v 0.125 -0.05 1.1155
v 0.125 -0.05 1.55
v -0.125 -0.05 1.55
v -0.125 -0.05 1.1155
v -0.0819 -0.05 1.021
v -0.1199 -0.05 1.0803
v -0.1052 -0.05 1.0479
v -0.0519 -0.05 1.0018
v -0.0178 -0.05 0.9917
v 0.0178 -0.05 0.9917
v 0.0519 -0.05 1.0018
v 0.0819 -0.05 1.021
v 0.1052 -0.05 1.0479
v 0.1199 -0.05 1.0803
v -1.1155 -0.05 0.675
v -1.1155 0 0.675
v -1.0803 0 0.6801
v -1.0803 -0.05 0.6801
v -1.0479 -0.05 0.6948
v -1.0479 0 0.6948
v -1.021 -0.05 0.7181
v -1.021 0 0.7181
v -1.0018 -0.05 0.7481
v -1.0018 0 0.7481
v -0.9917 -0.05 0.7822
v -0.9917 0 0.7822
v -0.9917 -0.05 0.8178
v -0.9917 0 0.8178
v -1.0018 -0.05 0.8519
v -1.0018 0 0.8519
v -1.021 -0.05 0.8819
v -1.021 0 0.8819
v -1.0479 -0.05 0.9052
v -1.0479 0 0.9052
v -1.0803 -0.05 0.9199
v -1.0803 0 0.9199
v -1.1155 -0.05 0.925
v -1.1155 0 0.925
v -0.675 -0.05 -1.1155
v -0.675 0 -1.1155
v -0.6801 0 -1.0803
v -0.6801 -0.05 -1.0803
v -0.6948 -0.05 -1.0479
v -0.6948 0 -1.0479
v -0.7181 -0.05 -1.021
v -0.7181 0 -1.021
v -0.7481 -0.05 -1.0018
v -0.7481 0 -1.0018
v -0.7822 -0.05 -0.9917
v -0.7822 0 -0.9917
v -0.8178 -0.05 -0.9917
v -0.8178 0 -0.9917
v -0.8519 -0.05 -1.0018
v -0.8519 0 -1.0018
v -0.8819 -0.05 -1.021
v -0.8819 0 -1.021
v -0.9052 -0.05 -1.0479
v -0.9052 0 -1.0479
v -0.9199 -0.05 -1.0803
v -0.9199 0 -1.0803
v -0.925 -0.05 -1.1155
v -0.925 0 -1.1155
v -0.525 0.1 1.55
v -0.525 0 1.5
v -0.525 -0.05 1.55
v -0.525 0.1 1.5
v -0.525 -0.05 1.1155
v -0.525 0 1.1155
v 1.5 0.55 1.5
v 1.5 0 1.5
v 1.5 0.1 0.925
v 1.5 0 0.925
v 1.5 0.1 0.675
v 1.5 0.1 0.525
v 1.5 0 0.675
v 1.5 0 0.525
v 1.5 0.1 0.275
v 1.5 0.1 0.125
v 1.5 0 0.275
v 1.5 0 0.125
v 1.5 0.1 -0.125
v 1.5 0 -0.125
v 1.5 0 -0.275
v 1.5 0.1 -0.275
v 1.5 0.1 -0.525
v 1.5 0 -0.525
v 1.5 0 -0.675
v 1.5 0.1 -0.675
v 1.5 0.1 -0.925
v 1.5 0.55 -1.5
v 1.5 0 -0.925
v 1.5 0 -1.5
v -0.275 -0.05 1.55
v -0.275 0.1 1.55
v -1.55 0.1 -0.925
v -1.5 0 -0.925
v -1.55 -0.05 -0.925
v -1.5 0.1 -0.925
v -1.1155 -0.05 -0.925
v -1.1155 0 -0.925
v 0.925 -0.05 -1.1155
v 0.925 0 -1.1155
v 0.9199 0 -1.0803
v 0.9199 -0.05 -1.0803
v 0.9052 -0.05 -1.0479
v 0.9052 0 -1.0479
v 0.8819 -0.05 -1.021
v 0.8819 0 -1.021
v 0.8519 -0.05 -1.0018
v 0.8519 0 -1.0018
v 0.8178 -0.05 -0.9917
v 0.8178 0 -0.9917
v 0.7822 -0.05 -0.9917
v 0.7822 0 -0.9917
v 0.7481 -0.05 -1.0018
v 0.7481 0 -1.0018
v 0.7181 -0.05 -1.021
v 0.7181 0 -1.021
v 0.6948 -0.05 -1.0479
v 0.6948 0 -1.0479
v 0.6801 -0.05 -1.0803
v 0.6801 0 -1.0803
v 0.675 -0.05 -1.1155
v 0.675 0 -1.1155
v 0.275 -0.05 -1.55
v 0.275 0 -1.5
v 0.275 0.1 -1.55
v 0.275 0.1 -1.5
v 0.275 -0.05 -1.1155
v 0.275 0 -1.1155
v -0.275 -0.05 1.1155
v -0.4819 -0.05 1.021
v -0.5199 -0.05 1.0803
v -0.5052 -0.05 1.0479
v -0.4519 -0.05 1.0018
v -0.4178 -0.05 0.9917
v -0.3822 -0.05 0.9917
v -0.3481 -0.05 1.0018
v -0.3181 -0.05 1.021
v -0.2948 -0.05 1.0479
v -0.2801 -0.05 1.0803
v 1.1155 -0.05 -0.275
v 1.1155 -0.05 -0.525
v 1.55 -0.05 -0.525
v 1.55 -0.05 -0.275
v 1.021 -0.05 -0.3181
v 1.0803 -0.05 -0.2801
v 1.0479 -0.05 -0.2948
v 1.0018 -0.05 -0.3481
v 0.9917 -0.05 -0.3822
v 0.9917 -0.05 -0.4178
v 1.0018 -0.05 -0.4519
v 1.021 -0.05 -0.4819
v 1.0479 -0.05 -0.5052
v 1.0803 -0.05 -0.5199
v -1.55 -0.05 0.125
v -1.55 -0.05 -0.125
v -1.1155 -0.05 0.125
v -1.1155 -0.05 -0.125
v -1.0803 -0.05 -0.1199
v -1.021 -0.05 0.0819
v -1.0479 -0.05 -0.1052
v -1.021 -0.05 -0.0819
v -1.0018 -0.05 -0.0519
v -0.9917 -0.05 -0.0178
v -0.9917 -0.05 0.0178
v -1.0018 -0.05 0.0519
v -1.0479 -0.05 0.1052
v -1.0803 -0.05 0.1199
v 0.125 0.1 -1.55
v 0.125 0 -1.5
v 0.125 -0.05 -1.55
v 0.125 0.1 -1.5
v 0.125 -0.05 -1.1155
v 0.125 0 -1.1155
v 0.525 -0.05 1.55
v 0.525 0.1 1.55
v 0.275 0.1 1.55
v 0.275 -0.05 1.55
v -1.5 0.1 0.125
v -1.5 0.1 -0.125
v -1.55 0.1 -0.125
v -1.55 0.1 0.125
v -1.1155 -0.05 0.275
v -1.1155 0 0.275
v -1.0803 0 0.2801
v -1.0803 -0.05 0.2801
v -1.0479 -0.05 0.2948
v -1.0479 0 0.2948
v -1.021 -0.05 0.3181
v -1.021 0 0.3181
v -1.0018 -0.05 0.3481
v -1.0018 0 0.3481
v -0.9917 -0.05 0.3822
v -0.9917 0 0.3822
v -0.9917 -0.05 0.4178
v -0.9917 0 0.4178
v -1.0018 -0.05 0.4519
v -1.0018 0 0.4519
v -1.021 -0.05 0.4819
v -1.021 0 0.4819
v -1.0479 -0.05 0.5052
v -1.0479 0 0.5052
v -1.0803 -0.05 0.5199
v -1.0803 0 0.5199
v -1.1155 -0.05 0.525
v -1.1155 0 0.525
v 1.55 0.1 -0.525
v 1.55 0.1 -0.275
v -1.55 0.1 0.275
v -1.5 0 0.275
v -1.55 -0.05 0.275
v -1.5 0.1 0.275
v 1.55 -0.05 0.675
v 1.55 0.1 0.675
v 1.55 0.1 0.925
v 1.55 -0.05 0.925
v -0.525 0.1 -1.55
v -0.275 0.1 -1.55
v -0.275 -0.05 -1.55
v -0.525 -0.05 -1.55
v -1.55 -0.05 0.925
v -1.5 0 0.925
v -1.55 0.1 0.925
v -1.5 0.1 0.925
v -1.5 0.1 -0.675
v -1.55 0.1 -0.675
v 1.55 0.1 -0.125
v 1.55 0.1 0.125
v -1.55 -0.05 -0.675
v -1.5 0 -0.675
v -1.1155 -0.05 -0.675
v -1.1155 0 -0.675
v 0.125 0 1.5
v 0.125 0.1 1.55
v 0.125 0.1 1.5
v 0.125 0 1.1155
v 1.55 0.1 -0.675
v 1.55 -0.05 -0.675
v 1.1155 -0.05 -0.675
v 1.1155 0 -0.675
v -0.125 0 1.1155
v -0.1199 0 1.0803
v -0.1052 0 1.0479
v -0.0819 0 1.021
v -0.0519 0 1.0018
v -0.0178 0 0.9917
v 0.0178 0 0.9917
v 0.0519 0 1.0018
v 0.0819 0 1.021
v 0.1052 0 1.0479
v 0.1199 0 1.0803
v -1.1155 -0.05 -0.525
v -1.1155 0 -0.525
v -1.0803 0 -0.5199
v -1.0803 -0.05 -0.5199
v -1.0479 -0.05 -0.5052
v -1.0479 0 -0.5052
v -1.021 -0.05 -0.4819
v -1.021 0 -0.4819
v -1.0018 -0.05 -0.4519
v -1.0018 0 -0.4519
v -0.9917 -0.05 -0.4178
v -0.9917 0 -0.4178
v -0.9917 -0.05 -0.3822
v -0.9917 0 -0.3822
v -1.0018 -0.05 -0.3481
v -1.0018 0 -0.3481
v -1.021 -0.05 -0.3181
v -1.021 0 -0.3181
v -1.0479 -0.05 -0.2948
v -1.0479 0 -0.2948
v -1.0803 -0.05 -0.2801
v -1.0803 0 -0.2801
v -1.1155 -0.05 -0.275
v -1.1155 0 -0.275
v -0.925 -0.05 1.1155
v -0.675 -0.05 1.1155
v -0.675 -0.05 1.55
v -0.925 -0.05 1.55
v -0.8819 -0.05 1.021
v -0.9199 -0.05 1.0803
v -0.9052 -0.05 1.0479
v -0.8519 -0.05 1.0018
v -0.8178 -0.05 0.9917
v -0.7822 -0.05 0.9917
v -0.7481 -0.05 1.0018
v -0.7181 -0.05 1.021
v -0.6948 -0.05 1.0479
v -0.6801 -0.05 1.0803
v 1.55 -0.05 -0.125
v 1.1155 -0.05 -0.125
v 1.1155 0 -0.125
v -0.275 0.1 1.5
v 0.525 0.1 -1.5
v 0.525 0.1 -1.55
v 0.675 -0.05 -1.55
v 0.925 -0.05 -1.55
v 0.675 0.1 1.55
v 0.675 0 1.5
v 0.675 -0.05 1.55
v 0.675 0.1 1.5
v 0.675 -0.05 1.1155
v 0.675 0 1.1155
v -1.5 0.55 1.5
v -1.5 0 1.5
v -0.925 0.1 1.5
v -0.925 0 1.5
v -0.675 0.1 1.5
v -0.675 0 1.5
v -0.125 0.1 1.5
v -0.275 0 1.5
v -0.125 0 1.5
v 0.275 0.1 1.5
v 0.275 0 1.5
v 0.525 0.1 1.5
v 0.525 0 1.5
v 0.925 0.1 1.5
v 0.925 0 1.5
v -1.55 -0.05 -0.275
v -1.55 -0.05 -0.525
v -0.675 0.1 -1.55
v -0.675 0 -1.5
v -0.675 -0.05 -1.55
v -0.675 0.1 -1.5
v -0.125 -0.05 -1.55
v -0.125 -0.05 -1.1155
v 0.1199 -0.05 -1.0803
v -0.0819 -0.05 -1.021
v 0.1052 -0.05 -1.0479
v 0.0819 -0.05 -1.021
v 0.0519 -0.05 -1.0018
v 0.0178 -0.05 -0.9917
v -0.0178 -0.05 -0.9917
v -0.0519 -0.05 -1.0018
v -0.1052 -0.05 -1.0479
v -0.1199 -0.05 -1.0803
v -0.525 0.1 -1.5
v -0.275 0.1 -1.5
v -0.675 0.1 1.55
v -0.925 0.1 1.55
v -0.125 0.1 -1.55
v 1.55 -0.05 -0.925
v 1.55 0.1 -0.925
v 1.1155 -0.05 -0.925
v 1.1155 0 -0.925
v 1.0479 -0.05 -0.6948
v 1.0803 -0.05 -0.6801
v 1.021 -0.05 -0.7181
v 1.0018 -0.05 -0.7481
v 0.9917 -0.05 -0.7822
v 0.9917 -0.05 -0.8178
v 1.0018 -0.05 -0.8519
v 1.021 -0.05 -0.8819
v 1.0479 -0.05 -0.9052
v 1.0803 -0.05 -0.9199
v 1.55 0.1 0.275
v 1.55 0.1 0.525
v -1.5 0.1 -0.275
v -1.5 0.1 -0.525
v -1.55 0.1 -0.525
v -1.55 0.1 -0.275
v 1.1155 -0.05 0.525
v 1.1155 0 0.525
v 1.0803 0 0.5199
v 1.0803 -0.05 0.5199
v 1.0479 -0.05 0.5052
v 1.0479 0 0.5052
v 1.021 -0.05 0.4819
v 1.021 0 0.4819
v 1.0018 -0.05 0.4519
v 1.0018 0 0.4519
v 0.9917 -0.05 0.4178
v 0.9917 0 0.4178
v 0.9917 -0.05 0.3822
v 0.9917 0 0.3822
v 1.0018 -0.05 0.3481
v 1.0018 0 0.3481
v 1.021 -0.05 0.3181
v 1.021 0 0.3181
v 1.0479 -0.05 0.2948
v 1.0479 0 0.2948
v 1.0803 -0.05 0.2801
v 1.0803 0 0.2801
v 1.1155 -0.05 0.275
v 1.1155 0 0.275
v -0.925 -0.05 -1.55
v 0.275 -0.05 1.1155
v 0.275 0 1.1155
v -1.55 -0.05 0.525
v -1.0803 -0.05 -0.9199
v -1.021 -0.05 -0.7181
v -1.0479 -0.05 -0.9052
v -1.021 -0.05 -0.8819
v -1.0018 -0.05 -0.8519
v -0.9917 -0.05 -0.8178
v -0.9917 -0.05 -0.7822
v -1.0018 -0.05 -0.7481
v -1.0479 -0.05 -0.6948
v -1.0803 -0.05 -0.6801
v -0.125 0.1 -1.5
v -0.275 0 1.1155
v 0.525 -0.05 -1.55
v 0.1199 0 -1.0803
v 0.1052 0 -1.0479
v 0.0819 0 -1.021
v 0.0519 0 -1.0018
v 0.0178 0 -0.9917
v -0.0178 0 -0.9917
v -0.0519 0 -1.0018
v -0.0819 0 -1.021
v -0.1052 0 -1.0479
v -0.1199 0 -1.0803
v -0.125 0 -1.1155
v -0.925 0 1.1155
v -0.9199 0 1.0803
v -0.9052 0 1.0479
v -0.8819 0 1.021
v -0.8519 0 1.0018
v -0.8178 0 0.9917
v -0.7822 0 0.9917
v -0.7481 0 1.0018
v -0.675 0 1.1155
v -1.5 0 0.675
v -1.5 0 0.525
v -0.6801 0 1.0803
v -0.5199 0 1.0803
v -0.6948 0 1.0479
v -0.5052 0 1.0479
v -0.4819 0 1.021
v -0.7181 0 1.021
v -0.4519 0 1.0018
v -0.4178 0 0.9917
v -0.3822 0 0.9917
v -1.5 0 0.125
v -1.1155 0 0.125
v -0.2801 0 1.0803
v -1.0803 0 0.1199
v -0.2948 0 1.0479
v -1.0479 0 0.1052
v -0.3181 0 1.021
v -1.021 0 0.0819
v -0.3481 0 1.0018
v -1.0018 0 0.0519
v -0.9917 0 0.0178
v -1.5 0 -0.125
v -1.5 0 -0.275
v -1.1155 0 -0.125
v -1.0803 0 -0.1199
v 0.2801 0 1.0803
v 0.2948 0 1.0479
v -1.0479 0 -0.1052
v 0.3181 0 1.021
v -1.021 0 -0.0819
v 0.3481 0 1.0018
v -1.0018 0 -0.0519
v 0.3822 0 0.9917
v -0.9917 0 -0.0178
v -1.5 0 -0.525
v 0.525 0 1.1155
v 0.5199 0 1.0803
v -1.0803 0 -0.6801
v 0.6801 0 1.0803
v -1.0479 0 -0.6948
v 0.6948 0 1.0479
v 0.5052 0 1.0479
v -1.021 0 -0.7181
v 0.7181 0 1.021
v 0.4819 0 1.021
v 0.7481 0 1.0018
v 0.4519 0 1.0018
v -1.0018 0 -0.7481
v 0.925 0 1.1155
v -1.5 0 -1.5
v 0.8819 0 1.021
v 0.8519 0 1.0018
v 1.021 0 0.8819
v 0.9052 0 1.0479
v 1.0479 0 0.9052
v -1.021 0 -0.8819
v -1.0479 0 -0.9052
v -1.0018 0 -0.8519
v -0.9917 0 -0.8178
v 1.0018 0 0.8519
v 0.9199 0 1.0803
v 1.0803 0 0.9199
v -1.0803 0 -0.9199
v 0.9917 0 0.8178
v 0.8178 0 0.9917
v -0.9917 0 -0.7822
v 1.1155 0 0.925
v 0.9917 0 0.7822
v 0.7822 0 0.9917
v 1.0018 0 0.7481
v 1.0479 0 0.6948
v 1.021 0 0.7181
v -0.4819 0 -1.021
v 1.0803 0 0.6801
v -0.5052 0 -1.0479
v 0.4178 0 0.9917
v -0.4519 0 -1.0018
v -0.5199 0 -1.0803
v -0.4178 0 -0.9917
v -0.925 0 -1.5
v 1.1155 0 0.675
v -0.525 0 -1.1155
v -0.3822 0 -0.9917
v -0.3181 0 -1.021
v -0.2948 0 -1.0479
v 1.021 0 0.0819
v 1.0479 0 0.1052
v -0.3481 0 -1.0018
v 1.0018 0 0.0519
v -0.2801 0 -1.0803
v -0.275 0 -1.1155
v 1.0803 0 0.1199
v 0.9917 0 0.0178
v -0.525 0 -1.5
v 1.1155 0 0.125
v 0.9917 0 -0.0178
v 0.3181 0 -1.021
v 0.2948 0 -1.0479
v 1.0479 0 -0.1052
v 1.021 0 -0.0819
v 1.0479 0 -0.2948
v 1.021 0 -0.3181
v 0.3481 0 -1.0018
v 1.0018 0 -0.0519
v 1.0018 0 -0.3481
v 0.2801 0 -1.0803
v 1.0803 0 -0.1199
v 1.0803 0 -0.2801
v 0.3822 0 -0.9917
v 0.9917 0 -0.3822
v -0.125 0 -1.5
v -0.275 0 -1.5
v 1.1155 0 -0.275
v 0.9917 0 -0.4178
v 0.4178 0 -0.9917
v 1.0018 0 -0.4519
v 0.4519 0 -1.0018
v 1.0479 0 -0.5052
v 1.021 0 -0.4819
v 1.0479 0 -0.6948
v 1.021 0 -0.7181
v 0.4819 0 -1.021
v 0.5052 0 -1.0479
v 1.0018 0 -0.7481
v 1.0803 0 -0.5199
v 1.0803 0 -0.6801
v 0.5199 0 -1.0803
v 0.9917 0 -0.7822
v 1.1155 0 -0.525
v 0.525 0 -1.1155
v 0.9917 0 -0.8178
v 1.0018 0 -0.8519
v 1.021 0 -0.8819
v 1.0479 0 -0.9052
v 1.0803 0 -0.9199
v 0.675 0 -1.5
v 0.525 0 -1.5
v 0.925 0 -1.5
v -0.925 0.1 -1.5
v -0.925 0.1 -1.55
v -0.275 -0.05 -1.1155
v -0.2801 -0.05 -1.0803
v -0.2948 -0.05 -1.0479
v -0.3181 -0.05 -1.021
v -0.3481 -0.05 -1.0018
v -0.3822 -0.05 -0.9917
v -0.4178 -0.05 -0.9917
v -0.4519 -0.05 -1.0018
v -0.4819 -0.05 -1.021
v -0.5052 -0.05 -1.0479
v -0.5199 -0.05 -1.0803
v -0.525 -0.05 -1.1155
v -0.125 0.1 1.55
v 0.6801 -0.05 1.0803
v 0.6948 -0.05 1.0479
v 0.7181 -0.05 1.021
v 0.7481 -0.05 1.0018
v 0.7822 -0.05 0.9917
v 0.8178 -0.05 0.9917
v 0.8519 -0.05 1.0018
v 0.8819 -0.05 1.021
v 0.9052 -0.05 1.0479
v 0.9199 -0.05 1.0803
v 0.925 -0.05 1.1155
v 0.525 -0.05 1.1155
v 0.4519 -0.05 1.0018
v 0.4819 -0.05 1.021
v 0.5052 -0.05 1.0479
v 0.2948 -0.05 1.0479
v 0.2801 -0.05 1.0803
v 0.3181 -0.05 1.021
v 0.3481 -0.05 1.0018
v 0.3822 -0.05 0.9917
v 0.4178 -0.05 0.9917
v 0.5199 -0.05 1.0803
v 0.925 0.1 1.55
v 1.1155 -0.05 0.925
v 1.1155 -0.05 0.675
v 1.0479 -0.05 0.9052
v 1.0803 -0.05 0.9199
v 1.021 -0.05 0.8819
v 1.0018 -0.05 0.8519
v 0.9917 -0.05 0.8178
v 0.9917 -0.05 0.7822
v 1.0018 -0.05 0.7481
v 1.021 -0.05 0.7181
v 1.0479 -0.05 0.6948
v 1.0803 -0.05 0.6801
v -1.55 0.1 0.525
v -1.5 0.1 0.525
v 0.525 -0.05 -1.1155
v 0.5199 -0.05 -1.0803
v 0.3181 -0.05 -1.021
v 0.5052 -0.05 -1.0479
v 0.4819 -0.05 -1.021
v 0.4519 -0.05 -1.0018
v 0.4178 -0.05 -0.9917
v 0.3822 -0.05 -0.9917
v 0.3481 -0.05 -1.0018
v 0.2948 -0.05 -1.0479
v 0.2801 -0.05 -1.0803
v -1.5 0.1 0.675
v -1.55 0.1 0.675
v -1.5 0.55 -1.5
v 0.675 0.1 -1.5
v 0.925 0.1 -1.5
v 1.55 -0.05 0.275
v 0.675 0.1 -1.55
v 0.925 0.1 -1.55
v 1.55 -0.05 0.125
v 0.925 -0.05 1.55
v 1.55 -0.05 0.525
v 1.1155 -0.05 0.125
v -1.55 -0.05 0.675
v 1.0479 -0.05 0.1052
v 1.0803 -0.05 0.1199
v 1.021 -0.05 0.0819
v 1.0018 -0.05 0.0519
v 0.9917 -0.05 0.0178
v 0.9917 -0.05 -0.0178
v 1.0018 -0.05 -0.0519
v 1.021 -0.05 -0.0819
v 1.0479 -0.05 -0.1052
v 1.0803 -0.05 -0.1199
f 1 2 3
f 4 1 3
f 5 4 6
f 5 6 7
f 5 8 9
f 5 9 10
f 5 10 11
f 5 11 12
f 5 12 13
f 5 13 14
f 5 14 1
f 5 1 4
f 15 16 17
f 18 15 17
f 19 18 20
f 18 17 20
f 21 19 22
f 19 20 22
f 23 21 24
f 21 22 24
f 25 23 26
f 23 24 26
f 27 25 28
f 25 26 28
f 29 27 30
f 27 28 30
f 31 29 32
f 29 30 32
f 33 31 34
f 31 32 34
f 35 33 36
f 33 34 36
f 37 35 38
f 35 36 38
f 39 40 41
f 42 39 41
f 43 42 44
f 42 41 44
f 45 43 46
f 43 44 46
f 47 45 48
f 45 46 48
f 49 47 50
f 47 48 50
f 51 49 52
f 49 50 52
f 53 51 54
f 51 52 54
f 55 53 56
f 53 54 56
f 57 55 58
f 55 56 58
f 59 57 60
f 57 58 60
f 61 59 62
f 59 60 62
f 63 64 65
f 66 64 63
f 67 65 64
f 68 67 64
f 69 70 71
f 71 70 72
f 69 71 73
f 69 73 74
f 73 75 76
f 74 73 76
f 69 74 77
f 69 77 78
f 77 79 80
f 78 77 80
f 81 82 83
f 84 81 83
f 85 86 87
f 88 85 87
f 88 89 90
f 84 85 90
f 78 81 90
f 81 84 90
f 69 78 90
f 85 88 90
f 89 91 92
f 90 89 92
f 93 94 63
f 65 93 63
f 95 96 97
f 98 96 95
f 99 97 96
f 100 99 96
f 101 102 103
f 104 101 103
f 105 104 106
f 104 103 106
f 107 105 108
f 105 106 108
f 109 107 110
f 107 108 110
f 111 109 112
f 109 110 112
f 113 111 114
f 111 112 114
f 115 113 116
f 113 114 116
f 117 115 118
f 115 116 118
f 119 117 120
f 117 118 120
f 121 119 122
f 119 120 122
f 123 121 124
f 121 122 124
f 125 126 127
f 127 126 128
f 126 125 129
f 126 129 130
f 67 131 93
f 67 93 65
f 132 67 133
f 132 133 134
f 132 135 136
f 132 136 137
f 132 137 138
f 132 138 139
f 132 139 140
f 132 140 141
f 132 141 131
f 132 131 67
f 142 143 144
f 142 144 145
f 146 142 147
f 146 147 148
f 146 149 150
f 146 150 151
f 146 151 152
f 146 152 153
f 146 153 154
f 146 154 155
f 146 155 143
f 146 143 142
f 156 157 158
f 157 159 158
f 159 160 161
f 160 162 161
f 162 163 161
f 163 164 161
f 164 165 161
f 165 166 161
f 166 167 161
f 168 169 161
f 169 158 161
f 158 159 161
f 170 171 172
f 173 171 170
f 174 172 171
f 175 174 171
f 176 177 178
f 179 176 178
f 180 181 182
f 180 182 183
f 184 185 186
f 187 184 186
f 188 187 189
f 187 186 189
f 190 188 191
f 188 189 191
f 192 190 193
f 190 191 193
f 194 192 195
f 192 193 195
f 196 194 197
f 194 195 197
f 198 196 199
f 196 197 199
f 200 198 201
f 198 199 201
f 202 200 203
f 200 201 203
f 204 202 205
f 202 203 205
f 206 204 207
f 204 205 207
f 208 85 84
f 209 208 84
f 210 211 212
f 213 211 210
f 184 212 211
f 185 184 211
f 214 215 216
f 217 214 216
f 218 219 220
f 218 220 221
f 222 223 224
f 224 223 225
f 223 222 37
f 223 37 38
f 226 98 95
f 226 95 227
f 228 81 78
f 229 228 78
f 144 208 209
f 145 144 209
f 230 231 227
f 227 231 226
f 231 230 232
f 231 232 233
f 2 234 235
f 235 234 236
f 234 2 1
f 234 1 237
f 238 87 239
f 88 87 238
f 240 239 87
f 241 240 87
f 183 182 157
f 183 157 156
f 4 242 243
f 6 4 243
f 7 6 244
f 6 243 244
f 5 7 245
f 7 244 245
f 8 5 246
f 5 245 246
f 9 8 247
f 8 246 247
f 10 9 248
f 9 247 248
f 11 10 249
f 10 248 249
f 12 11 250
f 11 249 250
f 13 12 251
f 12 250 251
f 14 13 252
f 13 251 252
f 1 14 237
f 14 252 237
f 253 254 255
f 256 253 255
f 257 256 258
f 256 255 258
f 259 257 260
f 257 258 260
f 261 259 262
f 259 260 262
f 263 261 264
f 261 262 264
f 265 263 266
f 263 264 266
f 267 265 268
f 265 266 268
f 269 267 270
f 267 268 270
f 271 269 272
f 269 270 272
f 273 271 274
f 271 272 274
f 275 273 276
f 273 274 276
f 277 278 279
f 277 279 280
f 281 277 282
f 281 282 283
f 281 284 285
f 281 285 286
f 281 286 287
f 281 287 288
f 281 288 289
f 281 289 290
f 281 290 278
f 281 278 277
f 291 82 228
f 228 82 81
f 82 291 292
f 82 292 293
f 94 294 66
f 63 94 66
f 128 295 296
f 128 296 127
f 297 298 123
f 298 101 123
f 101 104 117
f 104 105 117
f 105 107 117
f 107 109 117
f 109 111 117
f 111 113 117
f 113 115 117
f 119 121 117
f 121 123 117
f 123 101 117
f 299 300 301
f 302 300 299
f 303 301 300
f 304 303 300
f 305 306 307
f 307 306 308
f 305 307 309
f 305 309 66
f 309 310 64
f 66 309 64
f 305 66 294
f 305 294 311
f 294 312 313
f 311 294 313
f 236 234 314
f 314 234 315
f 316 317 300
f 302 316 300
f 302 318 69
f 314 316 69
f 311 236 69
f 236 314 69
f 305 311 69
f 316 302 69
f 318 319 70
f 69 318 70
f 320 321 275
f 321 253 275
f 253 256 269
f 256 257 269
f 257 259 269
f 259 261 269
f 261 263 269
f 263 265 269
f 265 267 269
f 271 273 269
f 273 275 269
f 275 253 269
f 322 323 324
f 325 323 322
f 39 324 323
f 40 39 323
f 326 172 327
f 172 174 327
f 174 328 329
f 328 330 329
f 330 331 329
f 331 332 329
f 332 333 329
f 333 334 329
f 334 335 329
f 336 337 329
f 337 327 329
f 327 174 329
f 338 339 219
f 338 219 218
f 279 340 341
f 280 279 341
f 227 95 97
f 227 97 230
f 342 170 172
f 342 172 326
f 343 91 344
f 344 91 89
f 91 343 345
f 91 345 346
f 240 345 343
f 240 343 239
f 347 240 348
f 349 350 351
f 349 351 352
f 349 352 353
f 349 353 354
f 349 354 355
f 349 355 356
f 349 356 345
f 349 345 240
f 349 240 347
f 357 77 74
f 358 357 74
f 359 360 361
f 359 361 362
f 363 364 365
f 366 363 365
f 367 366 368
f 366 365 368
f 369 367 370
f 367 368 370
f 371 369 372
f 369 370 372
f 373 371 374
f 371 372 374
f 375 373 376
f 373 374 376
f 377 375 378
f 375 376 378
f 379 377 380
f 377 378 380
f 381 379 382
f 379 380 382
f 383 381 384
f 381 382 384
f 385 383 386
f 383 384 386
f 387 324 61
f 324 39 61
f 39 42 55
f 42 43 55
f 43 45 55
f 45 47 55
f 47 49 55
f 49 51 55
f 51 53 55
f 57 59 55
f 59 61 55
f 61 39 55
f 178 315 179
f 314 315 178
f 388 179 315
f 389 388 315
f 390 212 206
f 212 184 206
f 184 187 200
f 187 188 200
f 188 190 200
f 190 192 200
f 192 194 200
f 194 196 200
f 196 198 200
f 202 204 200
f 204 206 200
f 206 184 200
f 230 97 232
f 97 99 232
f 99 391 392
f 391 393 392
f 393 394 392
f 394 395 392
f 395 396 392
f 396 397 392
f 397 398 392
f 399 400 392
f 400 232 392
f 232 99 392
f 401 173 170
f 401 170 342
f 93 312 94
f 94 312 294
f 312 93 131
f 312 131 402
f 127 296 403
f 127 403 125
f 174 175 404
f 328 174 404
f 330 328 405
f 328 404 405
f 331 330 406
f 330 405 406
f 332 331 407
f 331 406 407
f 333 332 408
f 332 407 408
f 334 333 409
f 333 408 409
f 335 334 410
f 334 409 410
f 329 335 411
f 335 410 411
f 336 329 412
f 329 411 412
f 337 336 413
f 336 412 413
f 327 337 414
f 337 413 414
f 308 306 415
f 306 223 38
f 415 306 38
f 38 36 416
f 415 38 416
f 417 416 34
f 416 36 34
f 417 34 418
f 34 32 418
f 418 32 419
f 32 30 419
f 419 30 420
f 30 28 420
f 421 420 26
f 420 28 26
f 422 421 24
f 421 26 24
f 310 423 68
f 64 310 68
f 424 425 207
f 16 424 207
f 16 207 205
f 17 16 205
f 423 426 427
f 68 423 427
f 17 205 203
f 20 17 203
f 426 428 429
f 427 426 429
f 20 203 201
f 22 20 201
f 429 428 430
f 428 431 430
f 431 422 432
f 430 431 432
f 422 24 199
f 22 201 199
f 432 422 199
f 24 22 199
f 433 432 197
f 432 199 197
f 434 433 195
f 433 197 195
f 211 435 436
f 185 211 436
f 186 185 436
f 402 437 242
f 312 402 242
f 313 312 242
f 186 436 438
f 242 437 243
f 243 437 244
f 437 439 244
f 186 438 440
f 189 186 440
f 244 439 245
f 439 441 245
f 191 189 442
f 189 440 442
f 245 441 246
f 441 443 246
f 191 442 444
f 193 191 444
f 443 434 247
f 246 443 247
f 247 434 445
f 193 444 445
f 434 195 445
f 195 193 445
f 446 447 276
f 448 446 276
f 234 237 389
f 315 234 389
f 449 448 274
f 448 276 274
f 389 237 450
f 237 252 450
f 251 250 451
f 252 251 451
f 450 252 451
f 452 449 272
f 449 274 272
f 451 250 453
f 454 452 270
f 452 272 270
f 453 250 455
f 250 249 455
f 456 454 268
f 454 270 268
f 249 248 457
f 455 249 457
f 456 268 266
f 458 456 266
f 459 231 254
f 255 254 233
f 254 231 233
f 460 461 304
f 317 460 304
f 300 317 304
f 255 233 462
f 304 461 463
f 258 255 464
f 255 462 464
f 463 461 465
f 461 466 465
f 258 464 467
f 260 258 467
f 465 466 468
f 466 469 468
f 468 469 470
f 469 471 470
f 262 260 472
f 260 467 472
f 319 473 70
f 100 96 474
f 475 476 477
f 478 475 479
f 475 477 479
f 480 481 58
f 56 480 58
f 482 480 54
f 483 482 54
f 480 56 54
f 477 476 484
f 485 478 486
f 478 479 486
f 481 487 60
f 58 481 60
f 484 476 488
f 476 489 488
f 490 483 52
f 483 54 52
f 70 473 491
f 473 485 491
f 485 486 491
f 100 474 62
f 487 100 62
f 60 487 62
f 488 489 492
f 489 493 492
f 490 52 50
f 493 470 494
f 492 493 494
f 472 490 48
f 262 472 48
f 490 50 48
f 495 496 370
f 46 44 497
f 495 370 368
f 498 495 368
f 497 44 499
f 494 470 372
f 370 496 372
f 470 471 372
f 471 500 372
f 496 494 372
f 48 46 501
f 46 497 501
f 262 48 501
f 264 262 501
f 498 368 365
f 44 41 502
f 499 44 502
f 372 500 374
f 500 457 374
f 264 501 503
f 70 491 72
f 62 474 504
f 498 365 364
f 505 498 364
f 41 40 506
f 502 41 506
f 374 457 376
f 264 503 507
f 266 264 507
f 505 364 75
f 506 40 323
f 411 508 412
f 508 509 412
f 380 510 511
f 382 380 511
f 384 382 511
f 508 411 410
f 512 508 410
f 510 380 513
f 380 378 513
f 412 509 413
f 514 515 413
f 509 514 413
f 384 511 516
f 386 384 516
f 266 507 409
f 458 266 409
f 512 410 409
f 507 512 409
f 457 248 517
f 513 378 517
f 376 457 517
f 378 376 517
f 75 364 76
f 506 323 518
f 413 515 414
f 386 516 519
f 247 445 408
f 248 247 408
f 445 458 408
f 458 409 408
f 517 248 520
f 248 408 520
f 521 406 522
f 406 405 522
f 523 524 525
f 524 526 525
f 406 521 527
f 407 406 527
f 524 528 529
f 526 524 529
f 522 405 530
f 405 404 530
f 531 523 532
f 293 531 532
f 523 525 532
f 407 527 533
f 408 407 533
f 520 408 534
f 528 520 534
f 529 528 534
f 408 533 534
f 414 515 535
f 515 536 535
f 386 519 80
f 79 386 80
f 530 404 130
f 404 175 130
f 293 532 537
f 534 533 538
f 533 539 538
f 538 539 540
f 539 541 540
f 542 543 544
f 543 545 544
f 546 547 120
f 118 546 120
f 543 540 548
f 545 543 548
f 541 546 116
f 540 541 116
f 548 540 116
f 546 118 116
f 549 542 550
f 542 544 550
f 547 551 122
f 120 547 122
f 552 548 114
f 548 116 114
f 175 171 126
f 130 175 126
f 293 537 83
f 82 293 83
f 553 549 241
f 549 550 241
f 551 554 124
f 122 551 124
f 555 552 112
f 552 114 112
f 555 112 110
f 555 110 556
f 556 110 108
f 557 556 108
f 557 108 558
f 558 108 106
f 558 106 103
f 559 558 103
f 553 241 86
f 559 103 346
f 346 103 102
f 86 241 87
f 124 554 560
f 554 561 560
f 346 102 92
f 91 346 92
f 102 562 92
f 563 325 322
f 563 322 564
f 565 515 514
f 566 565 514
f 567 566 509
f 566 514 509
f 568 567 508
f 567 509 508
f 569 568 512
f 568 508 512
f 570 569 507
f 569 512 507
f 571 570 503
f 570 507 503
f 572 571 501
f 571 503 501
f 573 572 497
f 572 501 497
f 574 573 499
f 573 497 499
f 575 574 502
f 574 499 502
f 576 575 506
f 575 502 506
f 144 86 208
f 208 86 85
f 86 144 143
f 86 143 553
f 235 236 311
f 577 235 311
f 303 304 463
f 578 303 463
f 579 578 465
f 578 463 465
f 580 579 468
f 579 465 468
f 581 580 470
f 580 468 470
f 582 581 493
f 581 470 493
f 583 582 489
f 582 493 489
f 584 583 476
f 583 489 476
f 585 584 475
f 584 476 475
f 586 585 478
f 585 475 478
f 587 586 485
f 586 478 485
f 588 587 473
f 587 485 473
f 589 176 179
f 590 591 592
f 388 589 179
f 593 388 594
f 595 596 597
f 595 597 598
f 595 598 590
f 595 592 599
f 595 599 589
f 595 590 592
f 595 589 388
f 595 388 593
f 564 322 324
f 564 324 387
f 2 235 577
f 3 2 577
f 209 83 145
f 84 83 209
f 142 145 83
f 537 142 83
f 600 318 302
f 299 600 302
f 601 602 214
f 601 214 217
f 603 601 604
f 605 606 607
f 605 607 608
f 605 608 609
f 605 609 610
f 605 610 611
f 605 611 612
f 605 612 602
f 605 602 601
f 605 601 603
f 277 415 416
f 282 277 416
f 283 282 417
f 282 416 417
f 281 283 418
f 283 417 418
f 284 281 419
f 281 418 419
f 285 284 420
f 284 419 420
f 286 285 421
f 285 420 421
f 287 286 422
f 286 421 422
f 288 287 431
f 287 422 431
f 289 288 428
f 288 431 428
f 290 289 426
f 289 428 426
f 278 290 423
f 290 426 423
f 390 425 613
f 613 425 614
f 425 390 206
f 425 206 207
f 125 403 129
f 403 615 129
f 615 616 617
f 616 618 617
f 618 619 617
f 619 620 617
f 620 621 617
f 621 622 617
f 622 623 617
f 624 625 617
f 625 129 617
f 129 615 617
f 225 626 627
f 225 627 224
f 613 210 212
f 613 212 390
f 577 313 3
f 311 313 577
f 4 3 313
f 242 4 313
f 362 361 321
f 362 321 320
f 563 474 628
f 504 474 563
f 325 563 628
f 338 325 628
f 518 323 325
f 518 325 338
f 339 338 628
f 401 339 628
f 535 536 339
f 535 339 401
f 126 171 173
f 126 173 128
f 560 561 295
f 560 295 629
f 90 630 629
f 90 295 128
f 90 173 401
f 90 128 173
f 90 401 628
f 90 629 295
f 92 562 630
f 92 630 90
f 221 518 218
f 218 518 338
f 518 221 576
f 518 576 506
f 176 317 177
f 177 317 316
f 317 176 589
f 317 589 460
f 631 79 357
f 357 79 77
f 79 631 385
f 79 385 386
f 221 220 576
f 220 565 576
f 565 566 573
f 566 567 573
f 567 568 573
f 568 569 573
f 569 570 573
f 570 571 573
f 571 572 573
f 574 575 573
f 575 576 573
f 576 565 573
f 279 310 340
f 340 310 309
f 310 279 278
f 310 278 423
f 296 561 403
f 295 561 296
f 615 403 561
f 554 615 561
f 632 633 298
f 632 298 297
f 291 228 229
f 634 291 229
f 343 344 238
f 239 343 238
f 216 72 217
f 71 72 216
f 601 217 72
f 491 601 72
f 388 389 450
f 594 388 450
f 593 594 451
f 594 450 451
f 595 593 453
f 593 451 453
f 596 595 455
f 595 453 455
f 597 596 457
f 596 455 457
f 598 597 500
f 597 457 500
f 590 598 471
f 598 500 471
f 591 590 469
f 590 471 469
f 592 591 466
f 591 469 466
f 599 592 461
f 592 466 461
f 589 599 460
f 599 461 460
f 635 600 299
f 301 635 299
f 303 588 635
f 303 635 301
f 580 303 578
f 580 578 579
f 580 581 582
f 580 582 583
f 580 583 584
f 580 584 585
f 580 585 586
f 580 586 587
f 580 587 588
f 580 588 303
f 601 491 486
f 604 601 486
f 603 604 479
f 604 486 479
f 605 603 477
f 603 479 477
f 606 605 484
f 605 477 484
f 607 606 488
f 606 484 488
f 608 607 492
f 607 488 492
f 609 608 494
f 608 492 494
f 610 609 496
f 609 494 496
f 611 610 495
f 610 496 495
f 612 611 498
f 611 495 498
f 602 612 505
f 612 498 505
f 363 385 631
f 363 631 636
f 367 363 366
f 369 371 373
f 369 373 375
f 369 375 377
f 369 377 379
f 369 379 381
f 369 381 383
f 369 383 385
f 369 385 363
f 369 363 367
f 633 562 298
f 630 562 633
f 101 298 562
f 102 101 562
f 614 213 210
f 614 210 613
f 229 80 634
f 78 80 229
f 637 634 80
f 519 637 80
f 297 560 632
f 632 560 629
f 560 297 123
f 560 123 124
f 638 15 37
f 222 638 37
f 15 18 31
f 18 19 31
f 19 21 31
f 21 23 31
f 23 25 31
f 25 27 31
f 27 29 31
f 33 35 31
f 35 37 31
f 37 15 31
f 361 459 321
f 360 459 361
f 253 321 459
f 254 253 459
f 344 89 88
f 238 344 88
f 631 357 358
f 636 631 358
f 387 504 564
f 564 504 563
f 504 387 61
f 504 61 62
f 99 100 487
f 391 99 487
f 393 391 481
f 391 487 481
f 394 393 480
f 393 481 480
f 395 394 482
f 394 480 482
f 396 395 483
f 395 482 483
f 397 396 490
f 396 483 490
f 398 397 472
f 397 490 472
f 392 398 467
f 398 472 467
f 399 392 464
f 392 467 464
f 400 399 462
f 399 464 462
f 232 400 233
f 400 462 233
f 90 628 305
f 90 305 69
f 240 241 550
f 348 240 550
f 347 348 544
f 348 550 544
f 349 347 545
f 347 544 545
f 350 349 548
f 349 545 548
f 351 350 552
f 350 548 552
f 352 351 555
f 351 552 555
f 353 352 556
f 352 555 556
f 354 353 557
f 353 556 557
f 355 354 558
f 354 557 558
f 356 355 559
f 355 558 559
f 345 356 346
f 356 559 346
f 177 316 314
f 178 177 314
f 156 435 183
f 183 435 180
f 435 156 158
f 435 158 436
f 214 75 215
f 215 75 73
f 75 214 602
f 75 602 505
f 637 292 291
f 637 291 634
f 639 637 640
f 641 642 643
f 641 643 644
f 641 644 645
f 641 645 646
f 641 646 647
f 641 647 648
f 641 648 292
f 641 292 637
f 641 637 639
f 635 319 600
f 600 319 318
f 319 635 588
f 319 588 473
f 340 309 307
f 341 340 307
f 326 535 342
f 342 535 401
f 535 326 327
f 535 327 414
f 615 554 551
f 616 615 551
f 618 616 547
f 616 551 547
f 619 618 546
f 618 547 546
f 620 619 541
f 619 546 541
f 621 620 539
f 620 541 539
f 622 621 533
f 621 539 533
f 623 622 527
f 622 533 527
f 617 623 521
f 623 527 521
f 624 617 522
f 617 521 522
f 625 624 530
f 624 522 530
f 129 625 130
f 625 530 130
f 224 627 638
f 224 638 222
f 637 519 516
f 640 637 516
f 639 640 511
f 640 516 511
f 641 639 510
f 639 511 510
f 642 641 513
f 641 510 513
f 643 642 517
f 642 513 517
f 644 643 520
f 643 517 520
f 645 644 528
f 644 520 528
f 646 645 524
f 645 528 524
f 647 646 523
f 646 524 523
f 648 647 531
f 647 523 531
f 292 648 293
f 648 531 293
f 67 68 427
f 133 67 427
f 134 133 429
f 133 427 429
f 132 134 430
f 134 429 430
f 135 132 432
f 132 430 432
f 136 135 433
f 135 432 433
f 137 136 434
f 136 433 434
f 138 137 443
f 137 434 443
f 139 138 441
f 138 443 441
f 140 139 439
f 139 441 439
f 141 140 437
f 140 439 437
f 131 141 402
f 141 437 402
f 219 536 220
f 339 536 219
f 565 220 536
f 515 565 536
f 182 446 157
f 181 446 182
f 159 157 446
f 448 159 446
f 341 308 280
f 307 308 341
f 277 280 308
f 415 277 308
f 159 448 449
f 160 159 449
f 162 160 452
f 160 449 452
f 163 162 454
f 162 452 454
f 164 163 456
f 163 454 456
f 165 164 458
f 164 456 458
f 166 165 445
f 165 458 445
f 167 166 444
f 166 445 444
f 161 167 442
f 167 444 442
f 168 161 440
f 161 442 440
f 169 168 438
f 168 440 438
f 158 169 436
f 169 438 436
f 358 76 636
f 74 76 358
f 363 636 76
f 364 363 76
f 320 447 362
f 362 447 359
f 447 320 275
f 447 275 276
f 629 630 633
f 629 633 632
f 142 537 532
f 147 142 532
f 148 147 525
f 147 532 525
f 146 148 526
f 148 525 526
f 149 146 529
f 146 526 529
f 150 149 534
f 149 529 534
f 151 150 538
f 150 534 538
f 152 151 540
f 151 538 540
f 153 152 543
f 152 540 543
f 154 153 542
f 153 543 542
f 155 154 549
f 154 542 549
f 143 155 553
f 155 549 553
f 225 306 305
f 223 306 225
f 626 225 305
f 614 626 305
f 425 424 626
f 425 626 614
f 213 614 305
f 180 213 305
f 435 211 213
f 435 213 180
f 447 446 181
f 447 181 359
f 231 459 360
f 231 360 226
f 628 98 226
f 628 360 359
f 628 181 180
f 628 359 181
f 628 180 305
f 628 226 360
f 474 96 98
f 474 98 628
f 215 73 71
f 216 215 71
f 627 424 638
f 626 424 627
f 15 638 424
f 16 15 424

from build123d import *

# Parameters (mm, degrees)
SKETCH1_W               = 3
SKETCH1_H               = 3
BOSS_EXTRUDE1_DEPTH     = 0.55
BOSS_EXTRUDE2_DEPTH     = 0.05
SKETCH3_W               = 0.25
SKETCH3_H               = 0.15
BOSS_EXTRUDE3_DEPTH     = 0.05
MIRROR3_COPY_1_SKETCH_W = 0.25
MIRROR3_COPY_1_SKETCH_H = 0.15
MIRROR3_COPY_1_DEPTH    = 0.05
MIRROR3_COPY_2_SKETCH_W = 0.25
MIRROR3_COPY_2_SKETCH_H = 0.15
MIRROR3_COPY_2_DEPTH    = 0.05


with BuildPart() as part:
    # Sketch1 → Boss-Extrude1 (new body)
    with BuildSketch(Plane(origin=(0, 0, 0), x_dir=(1, 0, 0), z_dir=(0, 1, 0))):
        Rectangle(SKETCH1_W, SKETCH1_H)
    extrude(amount=BOSS_EXTRUDE1_DEPTH)

    # Sketch2 → Boss-Extrude2 (add)
    with BuildSketch(Plane.XZ):
        with BuildLine():
            Line((-1.115476413, -0.675), (-1.5, -0.675))
            Line((-1.5, -0.675), (-1.5, -0.925))
            Line((-1.5, -0.925), (-1.115476413, -0.925))
            ThreePointArc((-1.115476413, -0.925), (-0.990476413, -0.8), (-1.115476413, -0.675))
        make_face()
        with BuildLine():
            Line((-1.115476413, -0.275), (-1.5, -0.275))
            Line((-1.5, -0.275), (-1.5, -0.525))
            Line((-1.5, -0.525), (-1.115476413, -0.525))
            ThreePointArc((-1.115476413, -0.525), (-0.990476413, -0.4), (-1.115476413, -0.275))
        make_face()
        with BuildLine():
            Line((-1.115476413, 0.525), (-1.5, 0.525))
            Line((-1.5, 0.525), (-1.5, 0.275))
            Line((-1.5, 0.275), (-1.115476413, 0.275))
            ThreePointArc((-1.115476413, 0.275), (-0.990476413, 0.4), (-1.115476413, 0.525))
        make_face()
        with BuildLine():
            Line((-1.115476413, 0.925), (-1.5, 0.925))
            Line((-1.5, 0.925), (-1.5, 0.675))
            Line((-1.5, 0.675), (-1.115476413, 0.675))
            ThreePointArc((-1.115476413, 0.675), (-0.990476413, 0.8), (-1.115476413, 0.925))
        make_face()
        with BuildLine():
            Line((-0.675, 1.115476413), (-0.675, 1.5))
            Line((-0.675, 1.5), (-0.925, 1.5))
            Line((-0.925, 1.5), (-0.925, 1.115476413))
            ThreePointArc((-0.925, 1.115476413), (-0.8, 0.990476413), (-0.675, 1.115476413))
        make_face()
        with BuildLine():
            Line((-0.275, 1.115476413), (-0.275, 1.5))
            Line((-0.275, 1.5), (-0.525, 1.5))
            Line((-0.525, 1.5), (-0.525, 1.115476413))
            ThreePointArc((-0.525, 1.115476413), (-0.4, 0.990476413), (-0.275, 1.115476413))
        make_face()
        with BuildLine():
            Line((0.125, 1.5), (-0.125, 1.5))
            Line((-0.125, 1.5), (-0.125, 1.115476413))
            ThreePointArc((-0.125, 1.115476413), (0, 0.990476413), (0.125, 1.115476413))
            Line((0.125, 1.115476413), (0.125, 1.5))
        make_face()
        with BuildLine():
            Line((0.525, 1.5), (0.275, 1.5))
            Line((0.275, 1.5), (0.275, 1.115476413))
            ThreePointArc((0.275, 1.115476413), (0.4, 0.990476413), (0.525, 1.115476413))
            Line((0.525, 1.115476413), (0.525, 1.5))
        make_face()
        with BuildLine():
            Line((0.925, 1.5), (0.675, 1.5))
            Line((0.675, 1.5), (0.675, 1.115476413))
            ThreePointArc((0.675, 1.115476413), (0.8, 0.990476413), (0.925, 1.115476413))
            Line((0.925, 1.115476413), (0.925, 1.5))
        make_face()
        with BuildLine():
            Line((1.5, 0.675), (1.5, 0.925))
            Line((1.5, 0.925), (1.115476413, 0.925))
            ThreePointArc((1.115476413, 0.925), (0.990476413, 0.8), (1.115476413, 0.675))
            Line((1.115476413, 0.675), (1.5, 0.675))
        make_face()
        with BuildLine():
            Line((1.5, 0.275), (1.5, 0.525))
            Line((1.5, 0.525), (1.115476413, 0.525))
            ThreePointArc((1.115476413, 0.525), (0.990476413, 0.4), (1.115476413, 0.275))
            Line((1.115476413, 0.275), (1.5, 0.275))
        make_face()
        with BuildLine():
            Line((1.5, -0.125), (1.5, 0.125))
            Line((1.5, 0.125), (1.115476413, 0.125))
            ThreePointArc((1.115476413, 0.125), (0.990476413, 0), (1.115476413, -0.125))
            Line((1.115476413, -0.125), (1.5, -0.125))
        make_face()
        with BuildLine():
            Line((1.5, -0.525), (1.5, -0.275))
            Line((1.5, -0.275), (1.115476413, -0.275))
            ThreePointArc((1.115476413, -0.275), (0.990476413, -0.4), (1.115476413, -0.525))
            Line((1.115476413, -0.525), (1.5, -0.525))
        make_face()
        with BuildLine():
            Line((1.5, -0.925), (1.5, -0.675))
            Line((1.5, -0.675), (1.115476413, -0.675))
            ThreePointArc((1.115476413, -0.675), (0.990476413, -0.8), (1.115476413, -0.925))
            Line((1.115476413, -0.925), (1.5, -0.925))
        make_face()
        with BuildLine():
            Line((0.675, -1.5), (0.925, -1.5))
            Line((0.925, -1.5), (0.925, -1.115476413))
            ThreePointArc((0.925, -1.115476413), (0.8, -0.990476413), (0.675, -1.115476413))
            Line((0.675, -1.115476413), (0.675, -1.5))
        make_face()
        with BuildLine():
            Line((0.275, -1.5), (0.525, -1.5))
            Line((0.525, -1.5), (0.525, -1.115476413))
            ThreePointArc((0.525, -1.115476413), (0.4, -0.990476413), (0.275, -1.115476413))
            Line((0.275, -1.115476413), (0.275, -1.5))
        make_face()
        with BuildLine():
            Line((-0.125, -1.115476413), (-0.125, -1.5))
            Line((-0.125, -1.5), (0.125, -1.5))
            Line((0.125, -1.5), (0.125, -1.115476413))
            ThreePointArc((0.125, -1.115476413), (0, -0.990476413), (-0.125, -1.115476413))
        make_face()
        with BuildLine():
            Line((-0.525, -1.115476413), (-0.525, -1.5))
            Line((-0.525, -1.5), (-0.275, -1.5))
            Line((-0.275, -1.5), (-0.275, -1.115476413))
            ThreePointArc((-0.275, -1.115476413), (-0.4, -0.990476413), (-0.525, -1.115476413))
        make_face()
        with BuildLine():
            Line((-0.925, -1.115476413), (-0.925, -1.5))
            Line((-0.925, -1.5), (-0.675, -1.5))
            Line((-0.675, -1.5), (-0.675, -1.115476413))
            ThreePointArc((-0.675, -1.115476413), (-0.8, -0.990476413), (-0.925, -1.115476413))
        make_face()
        with BuildLine():
            Line((-1.5, -0.125), (-1.115476413, -0.125))
            ThreePointArc((-1.115476413, -0.125), (-0.990476413, 0), (-1.115476413, 0.125))
            Line((-1.115476413, 0.125), (-1.5, 0.125))
            Line((-1.5, 0.125), (-1.5, -0.125))
        make_face()
    extrude(amount=BOSS_EXTRUDE2_DEPTH)

    # Sketch3 → Boss-Extrude3 (add)
    with BuildSketch(Plane.ZY.offset(1.5)):
        with Locations((-0.8, 0.025)):
            Rectangle(SKETCH3_W, SKETCH3_H)
        with Locations((-0.4, 0.025)):
            Rectangle(SKETCH3_W, SKETCH3_H)
        with Locations((0, 0.025)):
            Rectangle(SKETCH3_W, SKETCH3_H)
        with Locations((0.4, 0.025)):
            Rectangle(SKETCH3_W, SKETCH3_H)
        with Locations((0.8, 0.025)):
            Rectangle(SKETCH3_W, SKETCH3_H)
    boss_extrude3 = extrude(amount=BOSS_EXTRUDE3_DEPTH)

    # Mirror1: Boss-Extrude3 across plane
    add(boss_extrude3.mirror(Plane.ZY))

    # Mirror2: Boss-Extrude3 across plane
    add(boss_extrude3.mirror(Plane(origin=(0, 0, 0), x_dir=(-0.707106781, 0, 0.707106781), z_dir=(0.707106781, 0, 0.707106781))))

    # Mirror3 copy 1 sketch → Mirror3 copy 1 (add)
    with BuildSketch(Plane(origin=(0, 0, -1.5), x_dir=(-1, 0, 0), z_dir=(0, 0, -1))):
        with Locations((-0.8, 0.025)):
            Rectangle(MIRROR3_COPY_1_SKETCH_W, MIRROR3_COPY_1_SKETCH_H)
        with Locations((-0.4, 0.025)):
            Rectangle(MIRROR3_COPY_1_SKETCH_W, MIRROR3_COPY_1_SKETCH_H)
        with Locations((0, 0.025)):
            Rectangle(MIRROR3_COPY_1_SKETCH_W, MIRROR3_COPY_1_SKETCH_H)
        with Locations((0.4, 0.025)):
            Rectangle(MIRROR3_COPY_1_SKETCH_W, MIRROR3_COPY_1_SKETCH_H)
        with Locations((0.8, 0.025)):
            Rectangle(MIRROR3_COPY_1_SKETCH_W, MIRROR3_COPY_1_SKETCH_H)
    extrude(amount=MIRROR3_COPY_1_DEPTH)

    # Mirror3 copy 2 sketch → Mirror3 copy 2 (add)
    with BuildSketch(Plane(origin=(-1.5, 0, 0), x_dir=(0, 0, -1), z_dir=(-1, 0, 0))):
        with Locations((-0.8, -0.025)):
            Rectangle(MIRROR3_COPY_2_SKETCH_W, MIRROR3_COPY_2_SKETCH_H)
        with Locations((-0.4, -0.025)):
            Rectangle(MIRROR3_COPY_2_SKETCH_W, MIRROR3_COPY_2_SKETCH_H)
        with Locations((0, -0.025)):
            Rectangle(MIRROR3_COPY_2_SKETCH_W, MIRROR3_COPY_2_SKETCH_H)
        with Locations((0.4, -0.025)):
            Rectangle(MIRROR3_COPY_2_SKETCH_W, MIRROR3_COPY_2_SKETCH_H)
        with Locations((0.8, -0.025)):
            Rectangle(MIRROR3_COPY_2_SKETCH_W, MIRROR3_COPY_2_SKETCH_H)
    extrude(amount=MIRROR3_COPY_2_DEPTH)


solid = part.part
